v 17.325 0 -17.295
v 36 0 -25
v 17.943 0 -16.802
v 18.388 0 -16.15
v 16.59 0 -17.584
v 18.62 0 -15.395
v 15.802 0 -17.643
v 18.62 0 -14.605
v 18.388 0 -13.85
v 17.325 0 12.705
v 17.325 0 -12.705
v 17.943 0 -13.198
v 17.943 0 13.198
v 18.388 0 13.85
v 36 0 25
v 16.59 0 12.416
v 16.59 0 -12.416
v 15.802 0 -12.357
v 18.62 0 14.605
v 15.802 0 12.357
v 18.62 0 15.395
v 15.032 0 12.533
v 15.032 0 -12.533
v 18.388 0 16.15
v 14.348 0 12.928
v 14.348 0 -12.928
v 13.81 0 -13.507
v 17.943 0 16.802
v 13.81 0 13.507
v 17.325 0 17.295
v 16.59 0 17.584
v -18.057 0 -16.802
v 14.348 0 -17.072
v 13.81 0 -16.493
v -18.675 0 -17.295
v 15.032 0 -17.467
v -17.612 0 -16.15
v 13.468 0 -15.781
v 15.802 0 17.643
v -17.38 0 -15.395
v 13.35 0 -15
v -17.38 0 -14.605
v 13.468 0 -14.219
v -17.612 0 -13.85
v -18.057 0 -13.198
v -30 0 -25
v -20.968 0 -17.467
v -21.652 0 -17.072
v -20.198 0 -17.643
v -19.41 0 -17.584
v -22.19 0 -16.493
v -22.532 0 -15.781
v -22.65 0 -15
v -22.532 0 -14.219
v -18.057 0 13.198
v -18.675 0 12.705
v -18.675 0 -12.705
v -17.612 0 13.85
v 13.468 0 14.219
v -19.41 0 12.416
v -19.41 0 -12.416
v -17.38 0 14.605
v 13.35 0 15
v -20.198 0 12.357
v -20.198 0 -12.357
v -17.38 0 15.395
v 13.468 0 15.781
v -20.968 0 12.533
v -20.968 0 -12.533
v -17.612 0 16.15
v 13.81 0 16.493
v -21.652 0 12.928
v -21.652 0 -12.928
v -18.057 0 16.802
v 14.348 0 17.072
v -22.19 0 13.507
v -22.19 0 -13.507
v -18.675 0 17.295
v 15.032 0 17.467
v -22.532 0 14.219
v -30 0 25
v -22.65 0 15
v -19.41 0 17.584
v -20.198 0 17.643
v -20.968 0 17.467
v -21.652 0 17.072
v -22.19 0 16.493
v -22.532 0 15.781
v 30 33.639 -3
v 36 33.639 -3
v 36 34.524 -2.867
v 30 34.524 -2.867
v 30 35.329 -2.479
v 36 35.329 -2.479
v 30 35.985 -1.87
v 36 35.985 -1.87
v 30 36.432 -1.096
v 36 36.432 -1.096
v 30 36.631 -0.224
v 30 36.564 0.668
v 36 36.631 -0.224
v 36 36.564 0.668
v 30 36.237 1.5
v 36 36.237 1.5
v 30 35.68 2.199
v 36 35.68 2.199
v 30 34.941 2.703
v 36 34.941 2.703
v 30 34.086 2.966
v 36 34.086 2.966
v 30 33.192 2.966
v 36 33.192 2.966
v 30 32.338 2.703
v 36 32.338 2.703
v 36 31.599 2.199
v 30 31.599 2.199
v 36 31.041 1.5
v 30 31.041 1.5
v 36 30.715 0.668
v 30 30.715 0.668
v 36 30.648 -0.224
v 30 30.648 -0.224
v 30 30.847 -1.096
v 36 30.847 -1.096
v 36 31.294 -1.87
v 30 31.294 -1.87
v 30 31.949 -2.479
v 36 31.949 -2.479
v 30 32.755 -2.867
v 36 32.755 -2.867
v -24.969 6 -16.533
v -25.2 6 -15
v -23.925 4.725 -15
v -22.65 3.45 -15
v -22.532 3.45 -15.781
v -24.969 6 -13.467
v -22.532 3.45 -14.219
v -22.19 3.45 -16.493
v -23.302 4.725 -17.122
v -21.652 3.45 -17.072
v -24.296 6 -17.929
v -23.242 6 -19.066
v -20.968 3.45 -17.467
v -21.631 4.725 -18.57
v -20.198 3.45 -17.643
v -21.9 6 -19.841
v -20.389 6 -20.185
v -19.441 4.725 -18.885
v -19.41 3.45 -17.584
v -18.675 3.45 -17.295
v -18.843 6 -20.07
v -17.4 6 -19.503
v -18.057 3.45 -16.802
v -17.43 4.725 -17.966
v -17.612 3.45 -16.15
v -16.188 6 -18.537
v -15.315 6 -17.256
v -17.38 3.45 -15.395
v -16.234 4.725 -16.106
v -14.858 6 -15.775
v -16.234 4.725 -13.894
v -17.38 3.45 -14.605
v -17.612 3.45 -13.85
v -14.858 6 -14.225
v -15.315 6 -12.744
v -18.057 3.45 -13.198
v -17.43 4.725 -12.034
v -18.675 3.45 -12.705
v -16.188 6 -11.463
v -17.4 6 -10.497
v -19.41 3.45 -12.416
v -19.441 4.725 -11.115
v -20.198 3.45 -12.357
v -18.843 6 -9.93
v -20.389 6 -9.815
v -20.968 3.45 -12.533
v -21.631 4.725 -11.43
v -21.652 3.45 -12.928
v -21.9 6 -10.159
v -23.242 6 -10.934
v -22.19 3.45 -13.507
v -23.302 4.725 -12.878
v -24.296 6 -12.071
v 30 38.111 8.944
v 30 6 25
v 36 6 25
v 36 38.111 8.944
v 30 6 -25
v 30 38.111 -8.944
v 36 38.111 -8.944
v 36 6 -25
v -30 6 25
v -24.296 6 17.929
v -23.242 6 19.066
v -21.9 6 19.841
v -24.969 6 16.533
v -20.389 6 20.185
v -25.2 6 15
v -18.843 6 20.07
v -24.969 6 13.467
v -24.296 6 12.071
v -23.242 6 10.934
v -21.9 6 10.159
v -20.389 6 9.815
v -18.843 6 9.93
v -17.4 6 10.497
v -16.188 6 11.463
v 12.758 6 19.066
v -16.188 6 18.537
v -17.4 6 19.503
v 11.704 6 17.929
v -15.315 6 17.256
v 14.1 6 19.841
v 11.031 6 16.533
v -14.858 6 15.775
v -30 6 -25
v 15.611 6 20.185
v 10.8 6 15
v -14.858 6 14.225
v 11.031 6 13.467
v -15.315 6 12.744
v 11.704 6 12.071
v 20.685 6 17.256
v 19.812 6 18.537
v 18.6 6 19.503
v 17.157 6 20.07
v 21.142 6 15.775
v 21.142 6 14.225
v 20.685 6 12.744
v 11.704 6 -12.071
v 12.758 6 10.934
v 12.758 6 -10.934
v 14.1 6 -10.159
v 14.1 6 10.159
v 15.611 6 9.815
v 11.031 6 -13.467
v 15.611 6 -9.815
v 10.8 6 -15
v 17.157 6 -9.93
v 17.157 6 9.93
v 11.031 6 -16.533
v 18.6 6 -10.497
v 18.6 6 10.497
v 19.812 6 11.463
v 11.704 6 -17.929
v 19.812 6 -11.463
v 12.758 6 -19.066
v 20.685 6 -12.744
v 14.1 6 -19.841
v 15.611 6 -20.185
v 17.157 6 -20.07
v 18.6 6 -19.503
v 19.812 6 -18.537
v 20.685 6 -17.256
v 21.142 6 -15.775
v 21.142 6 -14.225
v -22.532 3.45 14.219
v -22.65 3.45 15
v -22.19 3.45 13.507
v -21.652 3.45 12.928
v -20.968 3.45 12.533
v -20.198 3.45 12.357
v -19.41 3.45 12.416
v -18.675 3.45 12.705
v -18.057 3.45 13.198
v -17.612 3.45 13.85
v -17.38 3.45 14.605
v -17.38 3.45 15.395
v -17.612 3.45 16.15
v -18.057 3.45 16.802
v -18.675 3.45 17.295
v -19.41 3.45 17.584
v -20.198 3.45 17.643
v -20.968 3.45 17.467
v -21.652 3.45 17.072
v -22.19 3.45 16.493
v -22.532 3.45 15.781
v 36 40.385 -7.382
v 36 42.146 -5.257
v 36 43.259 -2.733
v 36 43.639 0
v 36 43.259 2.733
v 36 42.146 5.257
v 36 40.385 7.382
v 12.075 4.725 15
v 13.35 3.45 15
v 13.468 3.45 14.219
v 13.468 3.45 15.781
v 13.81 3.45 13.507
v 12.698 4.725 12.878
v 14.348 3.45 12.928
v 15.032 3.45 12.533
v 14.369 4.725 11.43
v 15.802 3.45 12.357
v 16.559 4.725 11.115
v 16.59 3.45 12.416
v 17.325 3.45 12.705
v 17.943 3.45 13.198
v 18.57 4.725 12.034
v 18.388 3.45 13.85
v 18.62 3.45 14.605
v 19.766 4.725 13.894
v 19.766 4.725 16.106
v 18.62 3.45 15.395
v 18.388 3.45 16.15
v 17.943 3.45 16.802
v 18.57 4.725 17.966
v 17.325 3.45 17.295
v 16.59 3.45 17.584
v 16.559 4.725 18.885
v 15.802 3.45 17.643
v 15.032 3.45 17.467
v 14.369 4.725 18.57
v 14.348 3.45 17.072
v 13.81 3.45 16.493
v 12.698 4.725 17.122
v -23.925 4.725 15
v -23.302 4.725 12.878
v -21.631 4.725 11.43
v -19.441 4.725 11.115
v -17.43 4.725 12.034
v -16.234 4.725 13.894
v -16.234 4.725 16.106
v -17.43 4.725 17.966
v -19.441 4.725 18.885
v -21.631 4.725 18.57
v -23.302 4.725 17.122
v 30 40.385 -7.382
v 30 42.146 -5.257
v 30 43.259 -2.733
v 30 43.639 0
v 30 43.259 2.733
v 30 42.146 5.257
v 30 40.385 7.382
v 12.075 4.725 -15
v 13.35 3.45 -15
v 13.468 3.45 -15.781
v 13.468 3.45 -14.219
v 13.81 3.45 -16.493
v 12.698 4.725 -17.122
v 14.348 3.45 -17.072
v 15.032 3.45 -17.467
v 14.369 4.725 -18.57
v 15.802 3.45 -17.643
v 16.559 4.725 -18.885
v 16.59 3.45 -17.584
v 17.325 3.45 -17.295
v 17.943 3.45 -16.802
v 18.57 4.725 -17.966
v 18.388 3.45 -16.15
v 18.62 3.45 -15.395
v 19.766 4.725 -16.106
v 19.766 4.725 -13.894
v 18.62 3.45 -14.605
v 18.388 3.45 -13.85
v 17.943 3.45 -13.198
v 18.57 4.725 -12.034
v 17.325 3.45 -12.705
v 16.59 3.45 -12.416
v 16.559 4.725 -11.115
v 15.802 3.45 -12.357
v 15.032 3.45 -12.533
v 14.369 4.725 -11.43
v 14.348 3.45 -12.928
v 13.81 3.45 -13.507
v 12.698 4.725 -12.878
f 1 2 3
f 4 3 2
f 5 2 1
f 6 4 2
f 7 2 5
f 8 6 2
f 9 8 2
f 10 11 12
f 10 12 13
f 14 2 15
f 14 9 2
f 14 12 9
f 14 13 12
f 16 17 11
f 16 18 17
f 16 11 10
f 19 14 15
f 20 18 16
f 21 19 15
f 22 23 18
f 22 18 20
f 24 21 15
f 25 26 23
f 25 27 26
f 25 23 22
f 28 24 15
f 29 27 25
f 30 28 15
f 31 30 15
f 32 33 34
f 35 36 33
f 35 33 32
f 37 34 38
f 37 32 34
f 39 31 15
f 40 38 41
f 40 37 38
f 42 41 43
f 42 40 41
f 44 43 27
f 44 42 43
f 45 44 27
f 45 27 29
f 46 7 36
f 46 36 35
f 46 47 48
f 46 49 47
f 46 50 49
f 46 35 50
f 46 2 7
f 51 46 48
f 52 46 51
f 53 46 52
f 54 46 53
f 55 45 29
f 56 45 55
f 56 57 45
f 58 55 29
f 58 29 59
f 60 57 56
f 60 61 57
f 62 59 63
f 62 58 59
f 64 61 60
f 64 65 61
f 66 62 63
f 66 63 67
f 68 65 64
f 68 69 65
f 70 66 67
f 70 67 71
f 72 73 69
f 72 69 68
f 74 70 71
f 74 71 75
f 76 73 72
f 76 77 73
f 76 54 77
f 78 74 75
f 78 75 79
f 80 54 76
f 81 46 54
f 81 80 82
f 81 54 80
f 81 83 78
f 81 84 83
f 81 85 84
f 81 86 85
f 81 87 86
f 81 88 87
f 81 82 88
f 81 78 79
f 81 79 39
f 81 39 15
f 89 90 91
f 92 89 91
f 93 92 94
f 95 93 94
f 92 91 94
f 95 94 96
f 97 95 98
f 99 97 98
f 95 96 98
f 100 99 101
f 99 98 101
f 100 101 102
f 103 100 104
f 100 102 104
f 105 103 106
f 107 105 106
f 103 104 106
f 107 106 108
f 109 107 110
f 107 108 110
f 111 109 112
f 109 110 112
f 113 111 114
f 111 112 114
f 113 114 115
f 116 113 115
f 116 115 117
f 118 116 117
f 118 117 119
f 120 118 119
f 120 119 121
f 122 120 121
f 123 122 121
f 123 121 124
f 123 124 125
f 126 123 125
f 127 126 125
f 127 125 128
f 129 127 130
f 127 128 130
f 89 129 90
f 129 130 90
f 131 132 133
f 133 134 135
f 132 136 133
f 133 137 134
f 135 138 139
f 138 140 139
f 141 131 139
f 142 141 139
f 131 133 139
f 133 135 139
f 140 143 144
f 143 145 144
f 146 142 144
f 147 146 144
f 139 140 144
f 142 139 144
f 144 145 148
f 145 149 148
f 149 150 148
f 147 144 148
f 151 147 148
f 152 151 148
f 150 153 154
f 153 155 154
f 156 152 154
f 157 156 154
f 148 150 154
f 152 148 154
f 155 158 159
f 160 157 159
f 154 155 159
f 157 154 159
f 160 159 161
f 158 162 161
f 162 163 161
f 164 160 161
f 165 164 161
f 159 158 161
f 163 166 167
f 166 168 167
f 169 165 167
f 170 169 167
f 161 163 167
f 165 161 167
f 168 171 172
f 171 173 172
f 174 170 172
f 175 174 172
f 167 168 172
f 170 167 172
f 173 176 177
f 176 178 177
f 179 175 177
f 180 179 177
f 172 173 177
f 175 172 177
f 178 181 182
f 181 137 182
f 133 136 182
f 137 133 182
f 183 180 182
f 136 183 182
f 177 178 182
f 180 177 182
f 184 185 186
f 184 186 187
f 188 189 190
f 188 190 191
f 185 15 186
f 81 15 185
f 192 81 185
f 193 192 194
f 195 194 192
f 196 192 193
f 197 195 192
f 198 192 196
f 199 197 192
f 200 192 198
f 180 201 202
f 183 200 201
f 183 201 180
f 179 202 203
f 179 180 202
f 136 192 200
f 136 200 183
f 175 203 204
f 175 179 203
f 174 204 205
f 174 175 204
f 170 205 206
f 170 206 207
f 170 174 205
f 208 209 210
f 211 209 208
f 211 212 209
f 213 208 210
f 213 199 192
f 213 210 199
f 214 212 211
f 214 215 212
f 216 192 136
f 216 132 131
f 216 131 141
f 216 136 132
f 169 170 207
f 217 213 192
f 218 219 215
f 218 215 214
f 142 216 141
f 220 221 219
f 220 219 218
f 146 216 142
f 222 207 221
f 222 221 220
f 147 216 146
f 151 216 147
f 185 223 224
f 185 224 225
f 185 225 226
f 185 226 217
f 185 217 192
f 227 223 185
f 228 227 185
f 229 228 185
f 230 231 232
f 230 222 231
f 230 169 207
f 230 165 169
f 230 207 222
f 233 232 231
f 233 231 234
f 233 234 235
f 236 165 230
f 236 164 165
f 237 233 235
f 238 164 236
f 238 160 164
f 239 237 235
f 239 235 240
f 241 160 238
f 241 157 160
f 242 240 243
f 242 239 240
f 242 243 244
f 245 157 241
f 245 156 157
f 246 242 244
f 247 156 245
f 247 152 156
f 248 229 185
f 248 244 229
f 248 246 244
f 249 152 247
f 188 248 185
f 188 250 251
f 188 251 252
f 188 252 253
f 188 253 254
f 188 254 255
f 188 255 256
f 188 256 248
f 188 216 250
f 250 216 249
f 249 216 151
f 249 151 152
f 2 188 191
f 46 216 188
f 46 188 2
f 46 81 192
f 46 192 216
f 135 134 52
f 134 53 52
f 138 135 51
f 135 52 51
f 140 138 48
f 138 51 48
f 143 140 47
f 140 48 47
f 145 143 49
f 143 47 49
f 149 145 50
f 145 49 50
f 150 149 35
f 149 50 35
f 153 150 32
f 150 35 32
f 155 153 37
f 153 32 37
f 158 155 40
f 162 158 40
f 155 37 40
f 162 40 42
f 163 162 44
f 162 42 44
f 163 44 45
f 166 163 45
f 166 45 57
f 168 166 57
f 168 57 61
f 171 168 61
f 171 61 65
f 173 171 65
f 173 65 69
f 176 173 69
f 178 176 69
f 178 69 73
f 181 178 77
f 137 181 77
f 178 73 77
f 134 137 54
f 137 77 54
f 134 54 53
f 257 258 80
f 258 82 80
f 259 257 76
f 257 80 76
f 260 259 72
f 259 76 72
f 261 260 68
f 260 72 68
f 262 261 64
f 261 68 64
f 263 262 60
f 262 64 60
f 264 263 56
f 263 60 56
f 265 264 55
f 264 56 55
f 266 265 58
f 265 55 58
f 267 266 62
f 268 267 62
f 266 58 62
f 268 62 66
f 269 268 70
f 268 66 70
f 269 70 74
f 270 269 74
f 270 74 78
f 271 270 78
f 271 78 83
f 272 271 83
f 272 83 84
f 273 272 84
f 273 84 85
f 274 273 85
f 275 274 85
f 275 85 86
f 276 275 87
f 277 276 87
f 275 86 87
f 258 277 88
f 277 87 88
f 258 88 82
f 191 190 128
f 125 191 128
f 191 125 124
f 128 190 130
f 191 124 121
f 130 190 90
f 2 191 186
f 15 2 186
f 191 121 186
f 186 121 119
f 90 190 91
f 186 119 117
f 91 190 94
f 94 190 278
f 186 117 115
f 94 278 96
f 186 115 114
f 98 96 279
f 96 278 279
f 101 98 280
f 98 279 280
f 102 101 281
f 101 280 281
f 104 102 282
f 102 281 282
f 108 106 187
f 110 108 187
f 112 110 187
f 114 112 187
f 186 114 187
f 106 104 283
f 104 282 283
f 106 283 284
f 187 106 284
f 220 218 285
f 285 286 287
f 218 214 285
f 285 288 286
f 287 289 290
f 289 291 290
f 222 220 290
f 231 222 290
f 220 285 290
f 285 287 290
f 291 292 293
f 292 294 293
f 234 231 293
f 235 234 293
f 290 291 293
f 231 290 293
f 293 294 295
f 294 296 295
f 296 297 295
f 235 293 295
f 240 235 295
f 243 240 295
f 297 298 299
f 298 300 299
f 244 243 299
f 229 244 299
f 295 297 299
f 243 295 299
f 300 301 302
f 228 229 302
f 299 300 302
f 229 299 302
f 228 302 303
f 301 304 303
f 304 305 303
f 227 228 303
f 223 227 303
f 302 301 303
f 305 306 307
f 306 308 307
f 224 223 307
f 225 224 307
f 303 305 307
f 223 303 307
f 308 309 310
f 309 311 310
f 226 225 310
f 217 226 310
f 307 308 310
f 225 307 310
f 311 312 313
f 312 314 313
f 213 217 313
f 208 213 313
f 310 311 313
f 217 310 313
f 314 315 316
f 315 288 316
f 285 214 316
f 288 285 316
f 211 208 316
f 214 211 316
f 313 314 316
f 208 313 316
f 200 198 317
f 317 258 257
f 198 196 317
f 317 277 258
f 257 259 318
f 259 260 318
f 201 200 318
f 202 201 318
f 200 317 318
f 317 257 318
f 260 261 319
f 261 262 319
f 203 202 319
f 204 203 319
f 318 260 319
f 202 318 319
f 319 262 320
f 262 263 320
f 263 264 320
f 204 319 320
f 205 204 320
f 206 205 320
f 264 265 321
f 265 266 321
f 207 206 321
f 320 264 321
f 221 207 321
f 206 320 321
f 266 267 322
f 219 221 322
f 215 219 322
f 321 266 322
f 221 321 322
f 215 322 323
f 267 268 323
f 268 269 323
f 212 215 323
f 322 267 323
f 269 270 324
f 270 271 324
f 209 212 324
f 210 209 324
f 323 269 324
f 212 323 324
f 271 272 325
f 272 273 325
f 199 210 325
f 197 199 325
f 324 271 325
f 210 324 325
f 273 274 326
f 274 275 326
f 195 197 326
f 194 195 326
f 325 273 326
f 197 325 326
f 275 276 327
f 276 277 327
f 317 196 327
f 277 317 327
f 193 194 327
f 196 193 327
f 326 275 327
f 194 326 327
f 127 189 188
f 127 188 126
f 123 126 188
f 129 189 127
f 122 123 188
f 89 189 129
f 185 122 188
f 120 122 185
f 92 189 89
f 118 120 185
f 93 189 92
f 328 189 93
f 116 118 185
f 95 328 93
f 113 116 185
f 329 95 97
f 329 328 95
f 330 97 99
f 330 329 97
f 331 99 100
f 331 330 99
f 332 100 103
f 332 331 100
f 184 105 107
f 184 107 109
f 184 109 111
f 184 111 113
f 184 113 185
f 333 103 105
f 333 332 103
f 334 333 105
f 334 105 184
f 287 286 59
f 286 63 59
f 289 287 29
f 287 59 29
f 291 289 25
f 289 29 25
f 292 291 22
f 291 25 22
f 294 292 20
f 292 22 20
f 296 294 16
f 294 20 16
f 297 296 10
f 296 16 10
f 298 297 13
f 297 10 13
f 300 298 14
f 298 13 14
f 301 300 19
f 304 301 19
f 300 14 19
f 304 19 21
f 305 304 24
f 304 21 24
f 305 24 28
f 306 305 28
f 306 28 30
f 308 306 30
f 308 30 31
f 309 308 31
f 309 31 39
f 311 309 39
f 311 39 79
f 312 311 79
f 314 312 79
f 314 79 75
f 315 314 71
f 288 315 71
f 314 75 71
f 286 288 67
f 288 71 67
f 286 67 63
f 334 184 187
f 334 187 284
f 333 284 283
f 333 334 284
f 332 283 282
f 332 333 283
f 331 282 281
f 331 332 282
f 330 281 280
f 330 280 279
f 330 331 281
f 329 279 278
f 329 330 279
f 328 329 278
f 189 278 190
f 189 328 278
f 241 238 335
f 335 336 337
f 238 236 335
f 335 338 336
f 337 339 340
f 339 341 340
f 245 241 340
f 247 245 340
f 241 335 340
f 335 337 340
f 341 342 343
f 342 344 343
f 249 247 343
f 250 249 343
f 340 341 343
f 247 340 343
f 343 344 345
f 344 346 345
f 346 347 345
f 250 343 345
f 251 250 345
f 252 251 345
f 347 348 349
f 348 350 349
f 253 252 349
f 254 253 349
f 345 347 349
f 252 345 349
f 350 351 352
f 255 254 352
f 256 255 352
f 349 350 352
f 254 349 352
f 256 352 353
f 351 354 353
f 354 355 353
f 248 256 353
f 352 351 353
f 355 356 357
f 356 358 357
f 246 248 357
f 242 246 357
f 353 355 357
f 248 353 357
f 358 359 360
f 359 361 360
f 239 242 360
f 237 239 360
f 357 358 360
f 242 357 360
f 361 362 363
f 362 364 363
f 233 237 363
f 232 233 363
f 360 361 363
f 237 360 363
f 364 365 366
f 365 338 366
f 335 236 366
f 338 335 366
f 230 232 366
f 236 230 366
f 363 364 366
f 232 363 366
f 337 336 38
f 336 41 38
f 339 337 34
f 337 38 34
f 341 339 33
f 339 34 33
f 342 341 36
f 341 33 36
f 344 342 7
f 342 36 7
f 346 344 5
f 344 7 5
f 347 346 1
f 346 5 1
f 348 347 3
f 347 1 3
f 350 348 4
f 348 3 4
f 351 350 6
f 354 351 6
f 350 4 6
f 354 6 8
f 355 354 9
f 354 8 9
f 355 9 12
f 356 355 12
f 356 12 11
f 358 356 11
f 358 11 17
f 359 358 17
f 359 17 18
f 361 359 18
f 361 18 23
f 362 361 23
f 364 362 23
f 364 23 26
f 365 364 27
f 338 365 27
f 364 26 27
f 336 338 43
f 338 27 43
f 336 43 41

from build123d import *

# Parameters (mm, degrees)
SKETCH1_W                                            = 60
SKETCH1_H                                            = 50
BOSS_EXTRUDE1_DEPTH                                  = 6
CSK_FOR_M5_COUNTERSUNK_RAISED_HEAD_SCREW_D           = 5.3
CSK_FOR_M5_COUNTERSUNK_RAISED_HEAD_SCREW_CSINK_D     = 10.4
CSK_FOR_M5_COUNTERSUNK_RAISED_HEAD_SCREW_CSINK_ANGLE = 90
BOSS_EXTRUDE2_DEPTH                                  = 6
SKETCH6_R                                            = 3
CUT_EXTRUDE1_DEPTH                                   = 6


with BuildPart() as part:
    # Sketch1 → Boss-Extrude1 (new body)
    with BuildSketch(Plane(origin=(0, 0, 0), x_dir=(1, 0, 0), z_dir=(0, 1, 0))):
        Rectangle(SKETCH1_W, SKETCH1_H)
    extrude(amount=BOSS_EXTRUDE1_DEPTH)

    # CSK for M5 Countersunk Raised Head Screw1 (through all)
    with Locations(Plane(origin=(0, 6, 0), x_dir=(1, 0, 0), z_dir=(0, 1, 0))):
        with Locations((-20, -15), (16, -15), (16, 15), (-20, 15)):
            CounterSinkHole(CSK_FOR_M5_COUNTERSUNK_RAISED_HEAD_SCREW_D / 2, CSK_FOR_M5_COUNTERSUNK_RAISED_HEAD_SCREW_CSINK_D / 2, counter_sink_angle=CSK_FOR_M5_COUNTERSUNK_RAISED_HEAD_SCREW_CSINK_ANGLE)

    # Sketch5 → Boss-Extrude2 (add)
    with BuildSketch(Plane(origin=(30, 0, 0), x_dir=(0, 0, -1), z_dir=(1, 0, 0))):
        with BuildLine():
            Line((-25, 6), (-8.94427191, 38.11145618))
            ThreePointArc((-8.94427191, 38.11145618), (0, 43.639320225), (8.94427191, 38.11145618))
            Line((8.94427191, 38.11145618), (25, 6))
            Line((25, 6), (25, 0))
            Line((25, 0), (-25, 0))
            Line((-25, 0), (-25, 6))
        make_face()
    extrude(amount=BOSS_EXTRUDE2_DEPTH)

    # Sketch6 → Cut-Extrude1 (cut)
    with BuildSketch(Plane(origin=(36, 0, 0), x_dir=(0, 0, -1), z_dir=(1, 0, 0))):
        with Locations((0, 33.639320225)):
            Circle(SKETCH6_R)
    extrude(amount=-CUT_EXTRUDE1_DEPTH, mode=Mode.SUBTRACT)


solid = part.part
